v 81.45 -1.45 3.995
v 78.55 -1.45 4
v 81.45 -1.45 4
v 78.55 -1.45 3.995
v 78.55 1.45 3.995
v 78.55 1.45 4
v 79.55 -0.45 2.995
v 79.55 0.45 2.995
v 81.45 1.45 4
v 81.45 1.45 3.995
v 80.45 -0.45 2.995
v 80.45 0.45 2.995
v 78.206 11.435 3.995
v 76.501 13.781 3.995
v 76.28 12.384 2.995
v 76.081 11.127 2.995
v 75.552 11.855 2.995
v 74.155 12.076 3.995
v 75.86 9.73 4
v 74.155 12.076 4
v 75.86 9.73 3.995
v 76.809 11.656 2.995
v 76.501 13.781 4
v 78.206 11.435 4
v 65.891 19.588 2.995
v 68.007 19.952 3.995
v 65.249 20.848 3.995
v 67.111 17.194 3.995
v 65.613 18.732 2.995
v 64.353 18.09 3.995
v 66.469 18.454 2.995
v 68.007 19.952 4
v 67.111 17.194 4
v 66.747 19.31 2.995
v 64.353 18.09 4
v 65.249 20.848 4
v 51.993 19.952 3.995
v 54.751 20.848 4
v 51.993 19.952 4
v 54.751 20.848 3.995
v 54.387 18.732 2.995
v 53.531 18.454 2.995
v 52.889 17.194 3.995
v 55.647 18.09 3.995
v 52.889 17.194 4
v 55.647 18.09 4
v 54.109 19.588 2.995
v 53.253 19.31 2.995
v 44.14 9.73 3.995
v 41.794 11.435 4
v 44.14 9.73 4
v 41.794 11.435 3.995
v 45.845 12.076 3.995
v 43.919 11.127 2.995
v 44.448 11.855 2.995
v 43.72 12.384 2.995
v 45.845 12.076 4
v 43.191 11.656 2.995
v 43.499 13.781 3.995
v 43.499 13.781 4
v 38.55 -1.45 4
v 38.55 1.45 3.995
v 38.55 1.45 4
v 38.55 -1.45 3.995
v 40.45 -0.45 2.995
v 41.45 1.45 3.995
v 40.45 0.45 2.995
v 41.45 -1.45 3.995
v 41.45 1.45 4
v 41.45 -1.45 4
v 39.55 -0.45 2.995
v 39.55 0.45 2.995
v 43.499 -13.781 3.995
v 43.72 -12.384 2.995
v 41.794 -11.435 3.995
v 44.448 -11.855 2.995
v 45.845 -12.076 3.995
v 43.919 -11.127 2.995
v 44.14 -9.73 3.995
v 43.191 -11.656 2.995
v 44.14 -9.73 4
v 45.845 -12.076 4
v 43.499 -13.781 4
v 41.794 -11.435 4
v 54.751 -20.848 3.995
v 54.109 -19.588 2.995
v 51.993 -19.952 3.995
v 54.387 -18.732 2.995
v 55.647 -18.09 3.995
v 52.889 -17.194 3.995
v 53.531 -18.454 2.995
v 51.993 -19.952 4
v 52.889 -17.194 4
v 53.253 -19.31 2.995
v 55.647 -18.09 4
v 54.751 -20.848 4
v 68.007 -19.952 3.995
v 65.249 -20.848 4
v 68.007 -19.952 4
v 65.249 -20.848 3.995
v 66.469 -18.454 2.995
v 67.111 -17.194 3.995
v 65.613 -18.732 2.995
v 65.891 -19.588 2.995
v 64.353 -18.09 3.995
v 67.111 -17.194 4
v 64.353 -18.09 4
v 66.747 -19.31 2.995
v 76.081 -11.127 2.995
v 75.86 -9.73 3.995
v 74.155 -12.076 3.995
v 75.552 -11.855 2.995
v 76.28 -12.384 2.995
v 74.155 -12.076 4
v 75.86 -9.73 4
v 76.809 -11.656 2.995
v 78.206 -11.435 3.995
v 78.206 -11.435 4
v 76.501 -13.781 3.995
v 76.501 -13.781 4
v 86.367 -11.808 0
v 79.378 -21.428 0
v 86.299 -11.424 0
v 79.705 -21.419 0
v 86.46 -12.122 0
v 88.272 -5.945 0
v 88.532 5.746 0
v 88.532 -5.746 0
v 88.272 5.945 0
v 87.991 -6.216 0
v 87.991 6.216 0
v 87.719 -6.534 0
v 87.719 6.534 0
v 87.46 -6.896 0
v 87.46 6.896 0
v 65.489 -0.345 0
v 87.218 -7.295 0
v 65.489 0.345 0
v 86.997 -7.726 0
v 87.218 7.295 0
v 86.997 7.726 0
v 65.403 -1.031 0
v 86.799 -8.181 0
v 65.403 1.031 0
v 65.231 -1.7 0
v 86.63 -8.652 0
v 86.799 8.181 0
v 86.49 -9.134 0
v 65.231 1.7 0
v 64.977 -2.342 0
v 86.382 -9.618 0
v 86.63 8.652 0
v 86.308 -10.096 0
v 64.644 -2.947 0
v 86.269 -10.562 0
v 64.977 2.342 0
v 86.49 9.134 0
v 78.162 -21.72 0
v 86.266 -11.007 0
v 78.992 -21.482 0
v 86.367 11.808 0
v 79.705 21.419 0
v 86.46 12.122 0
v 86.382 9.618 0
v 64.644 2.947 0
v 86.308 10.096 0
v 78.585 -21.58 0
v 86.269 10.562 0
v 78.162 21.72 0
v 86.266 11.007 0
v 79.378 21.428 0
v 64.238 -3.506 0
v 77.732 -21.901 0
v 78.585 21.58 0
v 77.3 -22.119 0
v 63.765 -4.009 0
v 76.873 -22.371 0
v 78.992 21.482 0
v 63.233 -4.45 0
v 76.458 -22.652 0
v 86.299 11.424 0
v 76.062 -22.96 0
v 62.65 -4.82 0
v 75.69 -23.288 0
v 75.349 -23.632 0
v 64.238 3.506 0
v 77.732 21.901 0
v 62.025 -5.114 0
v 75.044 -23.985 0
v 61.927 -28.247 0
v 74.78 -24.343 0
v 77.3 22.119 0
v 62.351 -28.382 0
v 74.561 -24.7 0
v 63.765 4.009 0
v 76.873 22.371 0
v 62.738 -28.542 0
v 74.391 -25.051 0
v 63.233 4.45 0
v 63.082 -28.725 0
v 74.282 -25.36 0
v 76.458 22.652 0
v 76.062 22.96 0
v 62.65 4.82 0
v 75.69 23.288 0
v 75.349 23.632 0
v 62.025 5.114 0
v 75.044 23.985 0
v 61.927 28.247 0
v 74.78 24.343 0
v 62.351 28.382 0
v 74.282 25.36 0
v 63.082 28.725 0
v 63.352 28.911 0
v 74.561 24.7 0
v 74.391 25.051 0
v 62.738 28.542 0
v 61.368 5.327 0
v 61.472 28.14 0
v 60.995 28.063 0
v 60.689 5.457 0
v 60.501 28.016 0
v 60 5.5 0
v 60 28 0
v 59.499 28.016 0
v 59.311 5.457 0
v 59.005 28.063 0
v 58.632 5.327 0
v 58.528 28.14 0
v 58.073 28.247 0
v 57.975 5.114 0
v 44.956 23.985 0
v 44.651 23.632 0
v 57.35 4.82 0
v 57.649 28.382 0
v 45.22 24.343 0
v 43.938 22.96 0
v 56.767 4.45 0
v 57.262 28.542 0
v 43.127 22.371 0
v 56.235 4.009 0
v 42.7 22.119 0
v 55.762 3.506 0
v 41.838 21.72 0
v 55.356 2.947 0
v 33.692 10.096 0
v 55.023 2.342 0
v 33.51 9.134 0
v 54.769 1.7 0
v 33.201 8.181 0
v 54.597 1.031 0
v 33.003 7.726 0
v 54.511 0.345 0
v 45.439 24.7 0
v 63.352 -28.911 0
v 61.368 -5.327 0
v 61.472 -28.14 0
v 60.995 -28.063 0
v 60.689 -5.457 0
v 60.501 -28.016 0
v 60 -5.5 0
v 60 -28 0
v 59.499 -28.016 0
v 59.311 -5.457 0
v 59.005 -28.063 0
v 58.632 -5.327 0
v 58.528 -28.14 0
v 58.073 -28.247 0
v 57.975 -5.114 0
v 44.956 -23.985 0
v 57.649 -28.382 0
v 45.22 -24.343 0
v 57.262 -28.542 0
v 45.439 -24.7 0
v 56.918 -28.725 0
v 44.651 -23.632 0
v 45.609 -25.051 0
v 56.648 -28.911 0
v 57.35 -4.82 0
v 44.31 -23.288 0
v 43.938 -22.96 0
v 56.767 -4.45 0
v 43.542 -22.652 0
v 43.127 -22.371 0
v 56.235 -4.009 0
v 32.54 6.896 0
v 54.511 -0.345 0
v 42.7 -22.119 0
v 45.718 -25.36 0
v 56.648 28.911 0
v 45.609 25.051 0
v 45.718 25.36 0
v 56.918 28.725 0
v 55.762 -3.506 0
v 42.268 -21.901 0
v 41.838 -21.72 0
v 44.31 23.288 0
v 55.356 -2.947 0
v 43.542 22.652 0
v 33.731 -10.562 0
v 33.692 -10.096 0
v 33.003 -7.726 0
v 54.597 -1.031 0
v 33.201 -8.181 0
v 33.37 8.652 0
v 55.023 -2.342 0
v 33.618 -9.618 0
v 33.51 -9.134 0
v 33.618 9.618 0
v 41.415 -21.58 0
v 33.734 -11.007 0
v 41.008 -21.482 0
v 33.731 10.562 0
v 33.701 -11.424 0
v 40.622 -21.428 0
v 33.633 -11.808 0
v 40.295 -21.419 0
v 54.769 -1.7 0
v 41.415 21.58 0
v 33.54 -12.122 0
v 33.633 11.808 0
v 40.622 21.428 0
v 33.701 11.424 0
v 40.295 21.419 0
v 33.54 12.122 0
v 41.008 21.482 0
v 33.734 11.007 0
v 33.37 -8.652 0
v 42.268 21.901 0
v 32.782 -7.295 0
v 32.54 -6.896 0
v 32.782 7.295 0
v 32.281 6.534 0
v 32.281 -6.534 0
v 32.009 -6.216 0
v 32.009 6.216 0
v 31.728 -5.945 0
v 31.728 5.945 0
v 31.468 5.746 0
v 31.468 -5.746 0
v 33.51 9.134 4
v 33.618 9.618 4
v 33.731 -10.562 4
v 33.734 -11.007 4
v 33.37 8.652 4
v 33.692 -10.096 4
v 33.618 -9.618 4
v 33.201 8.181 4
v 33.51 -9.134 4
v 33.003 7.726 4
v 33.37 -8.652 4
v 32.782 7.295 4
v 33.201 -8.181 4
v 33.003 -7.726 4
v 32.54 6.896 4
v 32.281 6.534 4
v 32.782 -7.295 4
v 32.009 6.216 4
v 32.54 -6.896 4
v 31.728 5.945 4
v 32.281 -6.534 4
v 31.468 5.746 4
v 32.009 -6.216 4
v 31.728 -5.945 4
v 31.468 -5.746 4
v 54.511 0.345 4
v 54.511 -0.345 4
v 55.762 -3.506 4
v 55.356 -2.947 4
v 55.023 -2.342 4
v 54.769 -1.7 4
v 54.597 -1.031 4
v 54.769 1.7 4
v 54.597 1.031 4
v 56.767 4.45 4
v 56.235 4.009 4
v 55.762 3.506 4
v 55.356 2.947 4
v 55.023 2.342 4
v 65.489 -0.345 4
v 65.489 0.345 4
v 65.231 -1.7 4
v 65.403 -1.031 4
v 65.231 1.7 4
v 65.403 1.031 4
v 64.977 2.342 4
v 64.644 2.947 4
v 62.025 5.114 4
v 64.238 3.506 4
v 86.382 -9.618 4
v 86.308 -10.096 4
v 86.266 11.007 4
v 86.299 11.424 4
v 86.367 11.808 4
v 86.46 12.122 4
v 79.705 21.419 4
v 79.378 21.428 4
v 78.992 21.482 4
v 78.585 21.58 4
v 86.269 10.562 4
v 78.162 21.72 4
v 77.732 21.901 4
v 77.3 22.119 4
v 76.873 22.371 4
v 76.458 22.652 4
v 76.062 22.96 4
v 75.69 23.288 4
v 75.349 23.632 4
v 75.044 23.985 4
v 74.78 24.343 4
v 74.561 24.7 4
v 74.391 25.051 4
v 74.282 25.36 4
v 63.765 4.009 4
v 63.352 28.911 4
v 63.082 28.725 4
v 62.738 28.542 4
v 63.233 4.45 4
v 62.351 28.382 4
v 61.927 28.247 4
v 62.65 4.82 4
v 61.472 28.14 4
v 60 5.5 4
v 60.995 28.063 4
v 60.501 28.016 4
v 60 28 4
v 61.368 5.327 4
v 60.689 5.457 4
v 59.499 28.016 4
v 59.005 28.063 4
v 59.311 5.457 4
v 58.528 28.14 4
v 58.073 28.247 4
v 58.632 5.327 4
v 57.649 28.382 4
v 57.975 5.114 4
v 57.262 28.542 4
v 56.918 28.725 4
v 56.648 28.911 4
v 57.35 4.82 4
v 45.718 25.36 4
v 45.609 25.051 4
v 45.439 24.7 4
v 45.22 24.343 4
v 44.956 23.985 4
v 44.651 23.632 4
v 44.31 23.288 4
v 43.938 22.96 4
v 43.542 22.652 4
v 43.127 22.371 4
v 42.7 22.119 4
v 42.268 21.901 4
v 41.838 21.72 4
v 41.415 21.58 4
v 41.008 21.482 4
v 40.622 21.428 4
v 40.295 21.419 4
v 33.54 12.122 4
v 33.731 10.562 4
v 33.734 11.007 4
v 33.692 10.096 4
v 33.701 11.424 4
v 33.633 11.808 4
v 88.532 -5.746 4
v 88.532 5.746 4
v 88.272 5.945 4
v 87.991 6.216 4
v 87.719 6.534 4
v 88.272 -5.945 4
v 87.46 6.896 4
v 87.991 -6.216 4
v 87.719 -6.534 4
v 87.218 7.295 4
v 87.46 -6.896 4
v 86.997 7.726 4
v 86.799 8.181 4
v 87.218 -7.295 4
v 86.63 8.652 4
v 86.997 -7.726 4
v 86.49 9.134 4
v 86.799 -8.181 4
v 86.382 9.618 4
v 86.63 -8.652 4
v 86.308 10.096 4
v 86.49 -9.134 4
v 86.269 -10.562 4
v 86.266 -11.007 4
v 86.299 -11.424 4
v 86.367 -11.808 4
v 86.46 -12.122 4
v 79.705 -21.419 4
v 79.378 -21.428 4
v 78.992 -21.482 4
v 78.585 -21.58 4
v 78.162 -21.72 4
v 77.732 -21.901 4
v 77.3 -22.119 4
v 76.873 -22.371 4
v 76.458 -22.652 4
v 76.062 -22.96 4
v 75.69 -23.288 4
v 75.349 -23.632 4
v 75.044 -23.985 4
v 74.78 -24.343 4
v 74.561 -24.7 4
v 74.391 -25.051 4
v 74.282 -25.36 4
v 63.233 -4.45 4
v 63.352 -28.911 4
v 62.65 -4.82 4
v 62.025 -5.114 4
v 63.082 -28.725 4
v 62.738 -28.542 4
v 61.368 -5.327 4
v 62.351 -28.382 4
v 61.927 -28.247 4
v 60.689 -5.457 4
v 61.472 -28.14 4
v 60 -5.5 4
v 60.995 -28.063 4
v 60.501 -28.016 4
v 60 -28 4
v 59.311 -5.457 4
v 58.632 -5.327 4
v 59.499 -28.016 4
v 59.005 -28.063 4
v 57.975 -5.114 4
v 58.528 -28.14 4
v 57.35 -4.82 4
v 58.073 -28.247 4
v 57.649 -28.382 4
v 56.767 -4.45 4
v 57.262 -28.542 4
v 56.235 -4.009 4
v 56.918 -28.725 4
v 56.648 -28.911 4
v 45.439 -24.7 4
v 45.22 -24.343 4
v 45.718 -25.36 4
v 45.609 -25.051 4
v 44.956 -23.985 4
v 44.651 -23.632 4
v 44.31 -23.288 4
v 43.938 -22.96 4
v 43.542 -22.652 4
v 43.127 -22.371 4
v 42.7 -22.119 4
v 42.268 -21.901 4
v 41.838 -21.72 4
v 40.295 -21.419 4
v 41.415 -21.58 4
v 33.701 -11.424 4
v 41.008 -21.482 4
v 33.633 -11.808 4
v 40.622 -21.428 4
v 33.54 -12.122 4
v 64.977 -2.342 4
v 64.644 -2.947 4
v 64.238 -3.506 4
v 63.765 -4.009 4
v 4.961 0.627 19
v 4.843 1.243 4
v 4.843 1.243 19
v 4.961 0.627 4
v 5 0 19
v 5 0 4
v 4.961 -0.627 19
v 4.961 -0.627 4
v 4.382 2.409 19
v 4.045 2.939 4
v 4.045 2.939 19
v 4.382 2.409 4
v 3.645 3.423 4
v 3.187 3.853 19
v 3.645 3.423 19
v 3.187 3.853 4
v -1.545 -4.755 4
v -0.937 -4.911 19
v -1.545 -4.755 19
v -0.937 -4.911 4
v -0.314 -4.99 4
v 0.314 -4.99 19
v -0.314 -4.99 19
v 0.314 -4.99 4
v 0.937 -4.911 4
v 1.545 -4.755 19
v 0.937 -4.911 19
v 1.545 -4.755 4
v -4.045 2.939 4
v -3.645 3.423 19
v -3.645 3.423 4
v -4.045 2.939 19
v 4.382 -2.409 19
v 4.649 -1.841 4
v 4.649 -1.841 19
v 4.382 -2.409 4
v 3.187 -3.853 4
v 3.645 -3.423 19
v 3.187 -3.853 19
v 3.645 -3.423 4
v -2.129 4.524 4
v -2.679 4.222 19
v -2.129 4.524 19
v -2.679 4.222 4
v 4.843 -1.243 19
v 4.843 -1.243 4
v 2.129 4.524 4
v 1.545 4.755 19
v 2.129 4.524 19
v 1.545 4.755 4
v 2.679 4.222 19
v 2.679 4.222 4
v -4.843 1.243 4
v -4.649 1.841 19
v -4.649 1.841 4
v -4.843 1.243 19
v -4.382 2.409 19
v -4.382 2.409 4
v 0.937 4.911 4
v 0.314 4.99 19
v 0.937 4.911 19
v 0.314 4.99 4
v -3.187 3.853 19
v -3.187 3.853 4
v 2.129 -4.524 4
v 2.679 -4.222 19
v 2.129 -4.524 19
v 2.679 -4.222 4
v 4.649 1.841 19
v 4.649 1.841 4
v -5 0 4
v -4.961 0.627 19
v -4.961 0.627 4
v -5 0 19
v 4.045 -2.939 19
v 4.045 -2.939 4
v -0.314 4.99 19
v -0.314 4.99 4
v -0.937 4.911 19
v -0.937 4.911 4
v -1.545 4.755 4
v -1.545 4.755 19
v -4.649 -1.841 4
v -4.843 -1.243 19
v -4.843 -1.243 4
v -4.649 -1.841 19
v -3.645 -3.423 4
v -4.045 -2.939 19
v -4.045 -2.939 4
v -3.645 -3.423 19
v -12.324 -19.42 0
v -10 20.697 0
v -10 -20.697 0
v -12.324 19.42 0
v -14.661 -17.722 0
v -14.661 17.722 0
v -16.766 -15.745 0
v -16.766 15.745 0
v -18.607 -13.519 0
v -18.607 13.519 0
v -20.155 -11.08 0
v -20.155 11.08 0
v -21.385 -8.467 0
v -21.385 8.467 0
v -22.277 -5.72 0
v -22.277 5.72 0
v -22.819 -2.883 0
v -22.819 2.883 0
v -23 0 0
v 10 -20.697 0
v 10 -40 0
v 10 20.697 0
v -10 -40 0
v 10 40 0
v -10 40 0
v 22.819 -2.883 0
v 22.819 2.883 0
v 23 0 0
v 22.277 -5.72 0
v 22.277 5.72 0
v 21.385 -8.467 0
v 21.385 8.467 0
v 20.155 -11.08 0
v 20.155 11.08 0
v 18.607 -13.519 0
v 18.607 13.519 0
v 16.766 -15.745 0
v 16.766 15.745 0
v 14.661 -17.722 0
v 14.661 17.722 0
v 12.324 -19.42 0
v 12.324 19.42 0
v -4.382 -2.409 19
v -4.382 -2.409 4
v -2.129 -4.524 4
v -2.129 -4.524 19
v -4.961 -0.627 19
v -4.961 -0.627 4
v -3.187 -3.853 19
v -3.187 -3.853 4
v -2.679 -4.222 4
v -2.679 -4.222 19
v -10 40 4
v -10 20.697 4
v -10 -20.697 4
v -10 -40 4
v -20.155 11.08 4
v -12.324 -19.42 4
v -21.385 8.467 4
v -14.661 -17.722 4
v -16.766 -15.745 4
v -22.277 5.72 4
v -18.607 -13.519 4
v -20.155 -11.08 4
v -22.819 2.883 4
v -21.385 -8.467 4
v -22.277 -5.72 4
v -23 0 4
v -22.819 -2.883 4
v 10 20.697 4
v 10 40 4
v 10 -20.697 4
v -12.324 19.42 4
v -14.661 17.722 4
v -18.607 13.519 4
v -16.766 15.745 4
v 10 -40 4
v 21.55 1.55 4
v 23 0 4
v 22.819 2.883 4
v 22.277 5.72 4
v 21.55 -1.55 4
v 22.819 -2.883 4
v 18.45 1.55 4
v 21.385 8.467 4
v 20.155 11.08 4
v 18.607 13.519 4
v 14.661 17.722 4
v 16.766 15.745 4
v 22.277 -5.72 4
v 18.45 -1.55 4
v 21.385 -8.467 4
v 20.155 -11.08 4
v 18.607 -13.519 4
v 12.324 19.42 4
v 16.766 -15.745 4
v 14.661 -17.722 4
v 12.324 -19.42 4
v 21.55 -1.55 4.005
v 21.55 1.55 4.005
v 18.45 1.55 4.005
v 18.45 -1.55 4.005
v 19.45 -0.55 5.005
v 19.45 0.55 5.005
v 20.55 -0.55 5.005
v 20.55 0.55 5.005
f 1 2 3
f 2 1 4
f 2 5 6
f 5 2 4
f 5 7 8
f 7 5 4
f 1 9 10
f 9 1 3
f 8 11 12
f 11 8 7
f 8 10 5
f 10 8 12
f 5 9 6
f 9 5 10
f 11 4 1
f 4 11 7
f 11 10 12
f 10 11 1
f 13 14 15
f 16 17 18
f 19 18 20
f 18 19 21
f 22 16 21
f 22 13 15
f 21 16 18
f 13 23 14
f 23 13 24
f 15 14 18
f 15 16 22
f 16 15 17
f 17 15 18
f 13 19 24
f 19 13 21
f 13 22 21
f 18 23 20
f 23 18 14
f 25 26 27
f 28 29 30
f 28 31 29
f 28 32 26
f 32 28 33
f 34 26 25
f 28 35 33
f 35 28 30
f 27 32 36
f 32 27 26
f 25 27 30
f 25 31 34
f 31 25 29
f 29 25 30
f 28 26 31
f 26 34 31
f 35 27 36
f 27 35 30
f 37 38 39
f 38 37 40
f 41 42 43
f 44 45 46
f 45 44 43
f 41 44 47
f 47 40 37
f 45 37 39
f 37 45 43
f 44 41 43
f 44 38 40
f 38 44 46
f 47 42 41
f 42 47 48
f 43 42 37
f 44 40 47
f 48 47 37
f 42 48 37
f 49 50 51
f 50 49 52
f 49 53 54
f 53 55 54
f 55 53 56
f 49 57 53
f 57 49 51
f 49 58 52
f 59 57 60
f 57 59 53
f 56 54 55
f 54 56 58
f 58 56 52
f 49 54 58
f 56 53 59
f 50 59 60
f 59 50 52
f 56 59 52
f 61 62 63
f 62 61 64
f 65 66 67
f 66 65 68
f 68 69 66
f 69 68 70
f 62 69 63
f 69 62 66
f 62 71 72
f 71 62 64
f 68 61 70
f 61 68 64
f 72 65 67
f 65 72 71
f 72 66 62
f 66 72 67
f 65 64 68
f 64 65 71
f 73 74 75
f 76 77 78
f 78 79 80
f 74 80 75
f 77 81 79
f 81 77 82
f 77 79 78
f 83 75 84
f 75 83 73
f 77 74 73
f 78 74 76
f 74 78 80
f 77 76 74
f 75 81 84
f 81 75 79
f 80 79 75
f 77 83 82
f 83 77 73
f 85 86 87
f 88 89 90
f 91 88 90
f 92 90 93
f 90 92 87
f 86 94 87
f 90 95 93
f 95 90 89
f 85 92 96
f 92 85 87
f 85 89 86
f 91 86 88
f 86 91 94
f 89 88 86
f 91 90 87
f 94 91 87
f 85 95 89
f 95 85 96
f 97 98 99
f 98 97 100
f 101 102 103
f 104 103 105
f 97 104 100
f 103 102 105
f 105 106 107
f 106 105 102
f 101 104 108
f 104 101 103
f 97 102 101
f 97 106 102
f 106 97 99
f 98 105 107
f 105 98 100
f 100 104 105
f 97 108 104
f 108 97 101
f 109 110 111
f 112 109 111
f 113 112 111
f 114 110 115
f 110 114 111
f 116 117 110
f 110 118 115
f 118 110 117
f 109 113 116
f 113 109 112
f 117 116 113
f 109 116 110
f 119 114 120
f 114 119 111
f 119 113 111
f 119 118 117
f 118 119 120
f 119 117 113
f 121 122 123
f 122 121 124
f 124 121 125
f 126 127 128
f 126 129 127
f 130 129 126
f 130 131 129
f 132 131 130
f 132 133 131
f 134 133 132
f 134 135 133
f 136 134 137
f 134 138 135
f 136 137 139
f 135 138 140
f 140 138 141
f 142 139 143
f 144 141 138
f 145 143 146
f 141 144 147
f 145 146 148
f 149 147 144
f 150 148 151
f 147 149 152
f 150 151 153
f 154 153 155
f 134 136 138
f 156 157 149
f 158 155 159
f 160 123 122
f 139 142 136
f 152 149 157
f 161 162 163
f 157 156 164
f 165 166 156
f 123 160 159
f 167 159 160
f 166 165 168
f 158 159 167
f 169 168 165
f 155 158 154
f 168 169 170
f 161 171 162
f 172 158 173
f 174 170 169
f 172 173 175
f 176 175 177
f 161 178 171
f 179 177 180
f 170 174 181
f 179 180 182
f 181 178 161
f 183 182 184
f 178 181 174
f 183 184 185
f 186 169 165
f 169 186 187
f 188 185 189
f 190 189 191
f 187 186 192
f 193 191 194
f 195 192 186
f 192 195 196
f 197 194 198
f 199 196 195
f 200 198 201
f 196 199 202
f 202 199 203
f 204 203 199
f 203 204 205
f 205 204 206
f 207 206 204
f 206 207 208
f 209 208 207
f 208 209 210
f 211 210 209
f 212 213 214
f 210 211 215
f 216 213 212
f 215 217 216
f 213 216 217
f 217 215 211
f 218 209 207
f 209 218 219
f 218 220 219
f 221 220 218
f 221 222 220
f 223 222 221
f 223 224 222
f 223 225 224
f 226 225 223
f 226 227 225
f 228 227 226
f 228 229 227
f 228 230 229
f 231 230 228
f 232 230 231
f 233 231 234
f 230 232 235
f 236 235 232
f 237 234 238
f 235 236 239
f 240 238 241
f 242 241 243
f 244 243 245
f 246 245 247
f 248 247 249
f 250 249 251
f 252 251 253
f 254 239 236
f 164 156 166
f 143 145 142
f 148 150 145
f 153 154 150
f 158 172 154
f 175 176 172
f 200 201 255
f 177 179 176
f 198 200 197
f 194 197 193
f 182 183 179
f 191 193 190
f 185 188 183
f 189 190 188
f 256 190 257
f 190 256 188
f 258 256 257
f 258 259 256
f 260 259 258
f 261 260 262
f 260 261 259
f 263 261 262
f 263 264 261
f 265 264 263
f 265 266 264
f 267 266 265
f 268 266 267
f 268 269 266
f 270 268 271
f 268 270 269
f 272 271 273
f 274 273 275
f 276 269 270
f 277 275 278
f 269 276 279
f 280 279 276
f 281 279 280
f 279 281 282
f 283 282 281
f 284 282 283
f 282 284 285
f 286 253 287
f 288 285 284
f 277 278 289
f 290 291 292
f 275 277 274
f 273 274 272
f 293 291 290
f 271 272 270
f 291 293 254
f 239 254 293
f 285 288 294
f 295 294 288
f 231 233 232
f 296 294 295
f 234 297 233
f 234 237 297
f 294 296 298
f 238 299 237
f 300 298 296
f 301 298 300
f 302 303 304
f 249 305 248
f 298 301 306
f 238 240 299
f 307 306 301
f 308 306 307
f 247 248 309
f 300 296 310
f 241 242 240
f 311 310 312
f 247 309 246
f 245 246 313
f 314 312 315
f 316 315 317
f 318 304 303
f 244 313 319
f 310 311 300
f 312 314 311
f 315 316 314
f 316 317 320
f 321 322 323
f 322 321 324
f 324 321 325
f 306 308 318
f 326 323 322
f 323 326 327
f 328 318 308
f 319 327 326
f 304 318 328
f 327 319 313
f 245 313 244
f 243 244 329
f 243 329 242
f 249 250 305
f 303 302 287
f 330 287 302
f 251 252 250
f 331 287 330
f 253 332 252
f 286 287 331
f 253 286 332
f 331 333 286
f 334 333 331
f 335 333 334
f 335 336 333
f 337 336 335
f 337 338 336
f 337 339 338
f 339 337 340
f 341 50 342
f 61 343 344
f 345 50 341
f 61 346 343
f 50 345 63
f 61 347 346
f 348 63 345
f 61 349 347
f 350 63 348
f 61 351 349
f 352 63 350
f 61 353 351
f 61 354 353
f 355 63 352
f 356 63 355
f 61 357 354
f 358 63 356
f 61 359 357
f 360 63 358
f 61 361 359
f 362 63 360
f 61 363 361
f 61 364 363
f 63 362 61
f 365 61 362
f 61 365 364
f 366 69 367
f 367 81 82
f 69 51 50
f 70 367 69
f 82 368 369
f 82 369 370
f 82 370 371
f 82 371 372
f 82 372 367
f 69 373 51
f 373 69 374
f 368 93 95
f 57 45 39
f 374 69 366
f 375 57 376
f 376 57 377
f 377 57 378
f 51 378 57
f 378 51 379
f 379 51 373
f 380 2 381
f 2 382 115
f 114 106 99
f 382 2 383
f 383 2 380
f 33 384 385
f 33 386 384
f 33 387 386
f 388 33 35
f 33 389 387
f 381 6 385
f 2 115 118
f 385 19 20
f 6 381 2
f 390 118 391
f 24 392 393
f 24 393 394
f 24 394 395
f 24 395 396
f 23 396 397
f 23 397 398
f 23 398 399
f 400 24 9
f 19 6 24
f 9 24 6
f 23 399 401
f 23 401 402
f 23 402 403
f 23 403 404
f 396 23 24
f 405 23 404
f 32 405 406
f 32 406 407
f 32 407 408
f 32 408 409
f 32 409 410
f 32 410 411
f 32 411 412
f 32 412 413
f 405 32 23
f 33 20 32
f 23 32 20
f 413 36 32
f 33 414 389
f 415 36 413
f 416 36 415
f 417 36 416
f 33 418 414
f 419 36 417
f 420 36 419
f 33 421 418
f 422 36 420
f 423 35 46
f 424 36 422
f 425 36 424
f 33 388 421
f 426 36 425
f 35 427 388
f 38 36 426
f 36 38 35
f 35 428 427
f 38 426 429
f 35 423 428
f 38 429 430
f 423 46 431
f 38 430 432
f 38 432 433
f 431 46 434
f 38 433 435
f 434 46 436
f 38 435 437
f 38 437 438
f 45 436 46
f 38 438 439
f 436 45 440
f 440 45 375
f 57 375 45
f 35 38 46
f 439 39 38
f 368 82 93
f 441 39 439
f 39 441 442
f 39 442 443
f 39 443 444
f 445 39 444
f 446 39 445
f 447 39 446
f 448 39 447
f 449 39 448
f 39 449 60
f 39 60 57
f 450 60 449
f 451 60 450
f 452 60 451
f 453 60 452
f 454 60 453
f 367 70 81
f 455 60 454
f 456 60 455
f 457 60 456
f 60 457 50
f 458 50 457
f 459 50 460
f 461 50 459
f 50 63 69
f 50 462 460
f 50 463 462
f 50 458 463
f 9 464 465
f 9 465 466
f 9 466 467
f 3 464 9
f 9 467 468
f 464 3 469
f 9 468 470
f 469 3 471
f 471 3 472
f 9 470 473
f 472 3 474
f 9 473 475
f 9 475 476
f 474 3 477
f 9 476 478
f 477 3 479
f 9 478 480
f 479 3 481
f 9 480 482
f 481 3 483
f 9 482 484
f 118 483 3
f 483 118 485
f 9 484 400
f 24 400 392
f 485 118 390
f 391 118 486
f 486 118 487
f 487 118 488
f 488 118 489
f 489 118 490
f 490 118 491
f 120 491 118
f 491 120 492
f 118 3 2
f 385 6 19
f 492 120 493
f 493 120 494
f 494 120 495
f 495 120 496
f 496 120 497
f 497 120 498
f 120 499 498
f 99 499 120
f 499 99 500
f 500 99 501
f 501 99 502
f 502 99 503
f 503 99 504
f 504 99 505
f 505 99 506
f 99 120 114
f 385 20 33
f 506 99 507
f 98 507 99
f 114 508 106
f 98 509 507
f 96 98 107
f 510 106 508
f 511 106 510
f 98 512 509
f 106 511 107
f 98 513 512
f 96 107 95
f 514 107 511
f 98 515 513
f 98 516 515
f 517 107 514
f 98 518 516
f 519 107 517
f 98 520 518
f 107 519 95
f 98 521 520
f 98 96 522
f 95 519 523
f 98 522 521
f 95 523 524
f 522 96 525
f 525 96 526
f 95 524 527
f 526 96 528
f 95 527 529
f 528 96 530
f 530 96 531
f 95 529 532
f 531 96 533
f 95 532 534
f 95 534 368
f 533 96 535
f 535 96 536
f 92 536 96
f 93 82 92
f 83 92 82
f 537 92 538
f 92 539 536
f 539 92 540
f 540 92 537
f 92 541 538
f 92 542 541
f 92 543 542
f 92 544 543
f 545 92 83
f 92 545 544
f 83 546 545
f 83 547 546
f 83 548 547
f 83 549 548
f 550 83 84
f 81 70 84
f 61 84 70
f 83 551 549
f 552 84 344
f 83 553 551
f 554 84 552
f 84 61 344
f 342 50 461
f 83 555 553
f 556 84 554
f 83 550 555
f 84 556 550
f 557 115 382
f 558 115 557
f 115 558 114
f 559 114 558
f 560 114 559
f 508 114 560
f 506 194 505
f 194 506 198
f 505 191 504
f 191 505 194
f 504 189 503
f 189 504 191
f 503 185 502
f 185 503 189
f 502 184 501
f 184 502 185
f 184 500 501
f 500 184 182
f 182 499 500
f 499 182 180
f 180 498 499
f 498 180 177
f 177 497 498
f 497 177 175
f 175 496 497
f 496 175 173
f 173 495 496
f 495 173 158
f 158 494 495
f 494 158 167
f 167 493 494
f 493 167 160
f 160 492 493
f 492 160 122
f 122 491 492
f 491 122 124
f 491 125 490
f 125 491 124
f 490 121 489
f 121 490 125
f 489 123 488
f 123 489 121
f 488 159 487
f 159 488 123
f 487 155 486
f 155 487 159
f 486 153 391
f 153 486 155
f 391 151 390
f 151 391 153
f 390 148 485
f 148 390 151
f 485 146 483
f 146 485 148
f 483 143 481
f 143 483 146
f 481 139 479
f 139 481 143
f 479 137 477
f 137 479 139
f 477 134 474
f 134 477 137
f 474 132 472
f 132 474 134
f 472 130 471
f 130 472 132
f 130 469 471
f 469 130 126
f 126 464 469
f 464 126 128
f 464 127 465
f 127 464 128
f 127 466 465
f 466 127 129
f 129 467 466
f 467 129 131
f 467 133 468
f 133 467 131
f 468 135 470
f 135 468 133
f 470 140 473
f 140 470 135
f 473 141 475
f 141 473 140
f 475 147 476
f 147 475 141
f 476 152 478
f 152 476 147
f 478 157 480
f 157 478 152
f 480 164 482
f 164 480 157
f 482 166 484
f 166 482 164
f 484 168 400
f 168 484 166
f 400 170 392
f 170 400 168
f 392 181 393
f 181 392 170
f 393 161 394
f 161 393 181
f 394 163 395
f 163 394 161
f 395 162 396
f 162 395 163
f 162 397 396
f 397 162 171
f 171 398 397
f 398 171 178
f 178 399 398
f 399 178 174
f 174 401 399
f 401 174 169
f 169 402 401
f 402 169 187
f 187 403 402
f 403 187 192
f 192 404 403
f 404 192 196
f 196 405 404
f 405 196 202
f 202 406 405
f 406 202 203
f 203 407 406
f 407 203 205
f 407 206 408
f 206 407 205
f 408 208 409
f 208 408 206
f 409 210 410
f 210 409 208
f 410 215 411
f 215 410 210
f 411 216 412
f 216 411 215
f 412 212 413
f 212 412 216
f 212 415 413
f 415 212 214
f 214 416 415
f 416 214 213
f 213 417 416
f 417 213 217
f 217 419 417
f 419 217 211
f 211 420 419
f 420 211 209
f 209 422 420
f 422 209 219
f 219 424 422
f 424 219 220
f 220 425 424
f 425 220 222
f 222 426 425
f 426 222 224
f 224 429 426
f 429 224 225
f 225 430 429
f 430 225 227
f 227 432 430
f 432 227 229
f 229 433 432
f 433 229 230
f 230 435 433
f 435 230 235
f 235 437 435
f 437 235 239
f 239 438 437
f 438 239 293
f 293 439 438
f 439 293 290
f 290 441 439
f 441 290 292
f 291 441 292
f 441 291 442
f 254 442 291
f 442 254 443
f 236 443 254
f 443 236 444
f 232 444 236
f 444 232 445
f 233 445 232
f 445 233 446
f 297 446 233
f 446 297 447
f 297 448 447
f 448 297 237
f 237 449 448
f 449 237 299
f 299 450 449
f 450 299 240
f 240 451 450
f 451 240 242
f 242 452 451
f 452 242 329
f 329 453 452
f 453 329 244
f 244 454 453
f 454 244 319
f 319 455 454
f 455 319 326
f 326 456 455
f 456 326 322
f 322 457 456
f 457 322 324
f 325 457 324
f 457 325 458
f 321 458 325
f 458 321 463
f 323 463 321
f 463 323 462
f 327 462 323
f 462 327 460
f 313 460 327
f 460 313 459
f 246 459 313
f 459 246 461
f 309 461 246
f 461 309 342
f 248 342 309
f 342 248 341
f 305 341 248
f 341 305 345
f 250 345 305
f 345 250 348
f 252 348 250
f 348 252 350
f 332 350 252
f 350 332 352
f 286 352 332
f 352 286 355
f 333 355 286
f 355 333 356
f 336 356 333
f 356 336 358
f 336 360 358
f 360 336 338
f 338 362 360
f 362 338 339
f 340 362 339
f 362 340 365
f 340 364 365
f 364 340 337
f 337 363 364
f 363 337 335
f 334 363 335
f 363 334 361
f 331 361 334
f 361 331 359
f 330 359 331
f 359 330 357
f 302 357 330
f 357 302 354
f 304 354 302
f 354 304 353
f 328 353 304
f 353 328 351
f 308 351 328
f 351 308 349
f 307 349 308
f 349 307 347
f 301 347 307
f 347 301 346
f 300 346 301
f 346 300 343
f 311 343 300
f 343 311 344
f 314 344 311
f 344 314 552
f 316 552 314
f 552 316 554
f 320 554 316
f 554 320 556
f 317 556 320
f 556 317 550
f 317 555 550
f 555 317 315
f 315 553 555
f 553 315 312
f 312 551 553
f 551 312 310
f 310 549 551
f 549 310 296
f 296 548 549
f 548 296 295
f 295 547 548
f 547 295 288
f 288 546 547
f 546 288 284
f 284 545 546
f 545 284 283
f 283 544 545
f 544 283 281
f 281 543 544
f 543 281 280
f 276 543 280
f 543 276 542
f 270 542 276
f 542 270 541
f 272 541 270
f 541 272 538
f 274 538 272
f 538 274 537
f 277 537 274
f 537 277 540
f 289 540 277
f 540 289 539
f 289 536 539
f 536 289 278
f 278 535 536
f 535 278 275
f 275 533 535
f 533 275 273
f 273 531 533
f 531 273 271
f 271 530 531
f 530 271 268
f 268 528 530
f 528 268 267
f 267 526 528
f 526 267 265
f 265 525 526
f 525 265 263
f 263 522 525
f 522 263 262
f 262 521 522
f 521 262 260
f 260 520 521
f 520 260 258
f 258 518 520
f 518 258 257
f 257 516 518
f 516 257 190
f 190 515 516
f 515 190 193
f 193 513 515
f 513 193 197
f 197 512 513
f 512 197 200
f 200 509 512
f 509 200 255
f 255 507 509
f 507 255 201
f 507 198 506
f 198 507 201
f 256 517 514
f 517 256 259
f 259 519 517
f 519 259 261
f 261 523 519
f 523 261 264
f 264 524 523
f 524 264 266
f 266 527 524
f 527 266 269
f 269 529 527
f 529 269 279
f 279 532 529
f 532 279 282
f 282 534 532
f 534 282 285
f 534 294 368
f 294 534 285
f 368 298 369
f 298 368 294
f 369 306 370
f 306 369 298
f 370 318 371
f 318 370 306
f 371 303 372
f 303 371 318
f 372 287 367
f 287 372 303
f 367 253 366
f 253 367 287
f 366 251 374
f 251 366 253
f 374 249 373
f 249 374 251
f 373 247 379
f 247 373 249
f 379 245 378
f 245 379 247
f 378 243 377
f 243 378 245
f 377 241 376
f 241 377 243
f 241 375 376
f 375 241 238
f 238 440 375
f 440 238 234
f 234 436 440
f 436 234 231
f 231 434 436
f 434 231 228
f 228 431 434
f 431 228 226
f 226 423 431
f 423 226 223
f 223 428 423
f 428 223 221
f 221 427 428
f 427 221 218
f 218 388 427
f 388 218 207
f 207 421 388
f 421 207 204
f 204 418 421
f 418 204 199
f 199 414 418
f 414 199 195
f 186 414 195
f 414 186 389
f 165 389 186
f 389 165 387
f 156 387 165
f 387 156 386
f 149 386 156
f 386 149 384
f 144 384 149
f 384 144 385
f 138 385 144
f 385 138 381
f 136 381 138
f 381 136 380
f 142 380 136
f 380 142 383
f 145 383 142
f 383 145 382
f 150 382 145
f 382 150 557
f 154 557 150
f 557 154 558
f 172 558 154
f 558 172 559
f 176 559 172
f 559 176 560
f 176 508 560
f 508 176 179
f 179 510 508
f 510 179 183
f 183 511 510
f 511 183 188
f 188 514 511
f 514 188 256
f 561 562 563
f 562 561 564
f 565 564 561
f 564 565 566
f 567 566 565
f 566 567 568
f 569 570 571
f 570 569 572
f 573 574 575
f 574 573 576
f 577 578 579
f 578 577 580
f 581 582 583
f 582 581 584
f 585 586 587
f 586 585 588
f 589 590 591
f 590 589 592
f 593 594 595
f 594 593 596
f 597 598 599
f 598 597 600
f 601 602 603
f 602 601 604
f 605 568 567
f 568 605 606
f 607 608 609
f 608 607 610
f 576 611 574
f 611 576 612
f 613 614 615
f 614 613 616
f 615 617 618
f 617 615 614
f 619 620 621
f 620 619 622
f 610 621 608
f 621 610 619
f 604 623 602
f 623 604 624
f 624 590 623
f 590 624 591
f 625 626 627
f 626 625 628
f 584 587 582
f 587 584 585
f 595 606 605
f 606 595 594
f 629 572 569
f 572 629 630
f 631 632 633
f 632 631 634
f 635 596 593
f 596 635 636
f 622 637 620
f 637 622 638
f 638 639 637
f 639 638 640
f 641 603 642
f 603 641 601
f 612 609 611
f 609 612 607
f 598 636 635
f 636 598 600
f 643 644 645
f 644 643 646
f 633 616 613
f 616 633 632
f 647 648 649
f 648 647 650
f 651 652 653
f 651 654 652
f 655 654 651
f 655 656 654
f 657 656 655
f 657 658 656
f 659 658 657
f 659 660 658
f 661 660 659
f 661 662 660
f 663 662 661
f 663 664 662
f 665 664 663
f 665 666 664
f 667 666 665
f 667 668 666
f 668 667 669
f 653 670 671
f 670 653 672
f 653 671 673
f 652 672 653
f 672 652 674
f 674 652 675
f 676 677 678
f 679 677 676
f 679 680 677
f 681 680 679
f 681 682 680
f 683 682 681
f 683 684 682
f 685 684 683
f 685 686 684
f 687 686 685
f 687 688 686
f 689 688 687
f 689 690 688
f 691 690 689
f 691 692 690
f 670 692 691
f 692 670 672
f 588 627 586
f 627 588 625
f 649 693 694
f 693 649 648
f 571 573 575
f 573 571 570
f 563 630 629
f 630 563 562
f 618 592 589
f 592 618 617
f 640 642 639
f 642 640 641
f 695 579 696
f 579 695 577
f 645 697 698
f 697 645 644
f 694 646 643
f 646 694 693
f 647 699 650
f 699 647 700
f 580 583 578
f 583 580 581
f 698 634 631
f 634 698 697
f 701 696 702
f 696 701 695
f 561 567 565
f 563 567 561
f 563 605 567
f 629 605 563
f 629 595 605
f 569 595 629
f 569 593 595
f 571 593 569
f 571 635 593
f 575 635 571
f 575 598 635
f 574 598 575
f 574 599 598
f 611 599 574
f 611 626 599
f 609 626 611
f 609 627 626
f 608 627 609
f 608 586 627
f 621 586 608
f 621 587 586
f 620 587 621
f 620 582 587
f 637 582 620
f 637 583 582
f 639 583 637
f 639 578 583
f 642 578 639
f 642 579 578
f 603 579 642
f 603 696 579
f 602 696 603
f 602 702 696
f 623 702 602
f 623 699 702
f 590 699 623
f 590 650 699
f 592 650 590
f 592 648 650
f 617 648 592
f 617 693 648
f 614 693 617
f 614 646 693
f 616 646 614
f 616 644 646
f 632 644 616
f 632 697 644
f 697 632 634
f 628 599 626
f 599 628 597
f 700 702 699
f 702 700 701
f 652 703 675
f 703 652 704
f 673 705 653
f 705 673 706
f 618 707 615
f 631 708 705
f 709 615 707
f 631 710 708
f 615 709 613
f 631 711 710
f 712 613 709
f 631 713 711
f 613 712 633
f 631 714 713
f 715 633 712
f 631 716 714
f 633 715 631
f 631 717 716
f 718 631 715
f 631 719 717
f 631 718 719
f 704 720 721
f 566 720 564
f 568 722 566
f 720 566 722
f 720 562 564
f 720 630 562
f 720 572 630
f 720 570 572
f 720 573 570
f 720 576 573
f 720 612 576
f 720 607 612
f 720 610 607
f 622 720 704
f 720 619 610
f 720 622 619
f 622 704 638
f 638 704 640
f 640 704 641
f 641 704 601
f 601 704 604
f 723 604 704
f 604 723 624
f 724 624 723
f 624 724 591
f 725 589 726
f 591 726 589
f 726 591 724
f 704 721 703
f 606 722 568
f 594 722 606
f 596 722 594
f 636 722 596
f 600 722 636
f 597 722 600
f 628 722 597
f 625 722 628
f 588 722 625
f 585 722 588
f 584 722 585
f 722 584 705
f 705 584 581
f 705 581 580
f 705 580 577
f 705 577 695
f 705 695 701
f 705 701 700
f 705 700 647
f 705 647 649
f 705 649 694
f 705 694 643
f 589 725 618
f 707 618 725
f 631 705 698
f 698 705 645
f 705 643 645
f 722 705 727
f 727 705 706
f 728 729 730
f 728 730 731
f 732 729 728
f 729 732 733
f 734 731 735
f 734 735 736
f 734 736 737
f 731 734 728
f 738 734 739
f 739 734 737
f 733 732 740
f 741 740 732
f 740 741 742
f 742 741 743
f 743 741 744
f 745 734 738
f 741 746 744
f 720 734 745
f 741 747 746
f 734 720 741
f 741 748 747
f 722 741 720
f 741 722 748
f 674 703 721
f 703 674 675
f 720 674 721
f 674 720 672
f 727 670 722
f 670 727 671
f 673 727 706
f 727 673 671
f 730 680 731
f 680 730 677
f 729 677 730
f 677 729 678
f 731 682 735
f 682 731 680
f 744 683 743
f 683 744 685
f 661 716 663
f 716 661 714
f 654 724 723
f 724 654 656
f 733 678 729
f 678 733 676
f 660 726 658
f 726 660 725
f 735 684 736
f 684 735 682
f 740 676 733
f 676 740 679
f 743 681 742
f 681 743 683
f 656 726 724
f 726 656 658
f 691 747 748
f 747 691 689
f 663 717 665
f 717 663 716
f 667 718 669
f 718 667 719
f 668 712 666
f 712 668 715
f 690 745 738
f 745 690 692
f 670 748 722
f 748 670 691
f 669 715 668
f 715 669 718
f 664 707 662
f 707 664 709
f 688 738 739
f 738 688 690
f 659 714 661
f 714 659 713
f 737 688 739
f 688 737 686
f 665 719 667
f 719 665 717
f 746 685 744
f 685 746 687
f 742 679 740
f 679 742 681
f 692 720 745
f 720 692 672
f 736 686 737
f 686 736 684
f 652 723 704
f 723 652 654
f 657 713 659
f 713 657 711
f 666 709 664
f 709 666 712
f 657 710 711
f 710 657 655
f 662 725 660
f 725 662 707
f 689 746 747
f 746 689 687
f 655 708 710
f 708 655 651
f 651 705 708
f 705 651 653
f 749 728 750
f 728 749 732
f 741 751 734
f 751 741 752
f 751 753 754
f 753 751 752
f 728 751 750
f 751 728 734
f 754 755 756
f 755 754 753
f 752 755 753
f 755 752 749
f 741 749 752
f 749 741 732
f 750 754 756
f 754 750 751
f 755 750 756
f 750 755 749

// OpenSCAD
module pip(delta=0) {
    hull() {
        cube([3 + delta, 3 + delta, 0.01], center=true)
            ;
        translate([0, 0, 1])
        cube([1 + delta, 1 + delta, 0.01], center=true)
            ;
    }
        ;
}

module wheel(n, r, pips_r, rod_d, h) {
    difference() {
        linear_extrude(h)
        rotate(360 / n * 0.5)
        difference() {
            circle(r=r, $fn=n)
                ;
            circle(d=rod_d)
                ;
            for (i = [0 : n])
            rotate(i / n * 360)
            translate([r, 0])
            scale([1, 2])
            circle(r=2)
                ;
        }
            ;
        for (i = [0 : n])
        rotate(i / n * 360)
        translate([pips_r, 0, h])
        rotate([180, 0, 0])
        pip(delta=-0.1)
            ;
    }
}

module base(rod_d, pips_r, base_h) {
    cylinder(h=base_h + 15, d=rod_d)
        ;
    linear_extrude(base_h)
    square([20, 80], center=true)
        ;
    cylinder(h=base_h, r=pips_r + 3)
        ;
    translate([pips_r, 0, base_h])
    pip(delta=0.1)
        ;
}

WHEEL = 0;
BASE = 1;
ASSEMBLY = 2;
PRINTABLE = 3;

$fn = 50;
SHOW = PRINTABLE;
SHOW_N = 10;
SHOW_R = 30;
SHOW_PIPS_R = 20;
SHOW_ROD_D = 10;
SHOW_ROD_EPS = 1;
SHOW_BASE_H = 4;
SHOW_WHEEL_H = 4;

module show_wheel() {
    wheel(SHOW_N, SHOW_R, SHOW_PIPS_R, SHOW_ROD_D + SHOW_ROD_EPS, SHOW_WHEEL_H);
}

module show_base() {
    base(SHOW_ROD_D, SHOW_PIPS_R, SHOW_BASE_H);
}

if (SHOW == WHEEL) {
    show_wheel();
}
if (SHOW == BASE) {
    show_base();
}
if (SHOW == ASSEMBLY) {
    translate([0, 0, SHOW_BASE_H + SHOW_WHEEL_H + 1])
    color([0, 0, 1, 0.3])
    rotate([180, 0, 0])
    show_wheel()
        ;
    show_base();
}
if (SHOW == PRINTABLE) {
    translate([60, 0, 0])
    show_wheel()
        ;
    show_base();
}
